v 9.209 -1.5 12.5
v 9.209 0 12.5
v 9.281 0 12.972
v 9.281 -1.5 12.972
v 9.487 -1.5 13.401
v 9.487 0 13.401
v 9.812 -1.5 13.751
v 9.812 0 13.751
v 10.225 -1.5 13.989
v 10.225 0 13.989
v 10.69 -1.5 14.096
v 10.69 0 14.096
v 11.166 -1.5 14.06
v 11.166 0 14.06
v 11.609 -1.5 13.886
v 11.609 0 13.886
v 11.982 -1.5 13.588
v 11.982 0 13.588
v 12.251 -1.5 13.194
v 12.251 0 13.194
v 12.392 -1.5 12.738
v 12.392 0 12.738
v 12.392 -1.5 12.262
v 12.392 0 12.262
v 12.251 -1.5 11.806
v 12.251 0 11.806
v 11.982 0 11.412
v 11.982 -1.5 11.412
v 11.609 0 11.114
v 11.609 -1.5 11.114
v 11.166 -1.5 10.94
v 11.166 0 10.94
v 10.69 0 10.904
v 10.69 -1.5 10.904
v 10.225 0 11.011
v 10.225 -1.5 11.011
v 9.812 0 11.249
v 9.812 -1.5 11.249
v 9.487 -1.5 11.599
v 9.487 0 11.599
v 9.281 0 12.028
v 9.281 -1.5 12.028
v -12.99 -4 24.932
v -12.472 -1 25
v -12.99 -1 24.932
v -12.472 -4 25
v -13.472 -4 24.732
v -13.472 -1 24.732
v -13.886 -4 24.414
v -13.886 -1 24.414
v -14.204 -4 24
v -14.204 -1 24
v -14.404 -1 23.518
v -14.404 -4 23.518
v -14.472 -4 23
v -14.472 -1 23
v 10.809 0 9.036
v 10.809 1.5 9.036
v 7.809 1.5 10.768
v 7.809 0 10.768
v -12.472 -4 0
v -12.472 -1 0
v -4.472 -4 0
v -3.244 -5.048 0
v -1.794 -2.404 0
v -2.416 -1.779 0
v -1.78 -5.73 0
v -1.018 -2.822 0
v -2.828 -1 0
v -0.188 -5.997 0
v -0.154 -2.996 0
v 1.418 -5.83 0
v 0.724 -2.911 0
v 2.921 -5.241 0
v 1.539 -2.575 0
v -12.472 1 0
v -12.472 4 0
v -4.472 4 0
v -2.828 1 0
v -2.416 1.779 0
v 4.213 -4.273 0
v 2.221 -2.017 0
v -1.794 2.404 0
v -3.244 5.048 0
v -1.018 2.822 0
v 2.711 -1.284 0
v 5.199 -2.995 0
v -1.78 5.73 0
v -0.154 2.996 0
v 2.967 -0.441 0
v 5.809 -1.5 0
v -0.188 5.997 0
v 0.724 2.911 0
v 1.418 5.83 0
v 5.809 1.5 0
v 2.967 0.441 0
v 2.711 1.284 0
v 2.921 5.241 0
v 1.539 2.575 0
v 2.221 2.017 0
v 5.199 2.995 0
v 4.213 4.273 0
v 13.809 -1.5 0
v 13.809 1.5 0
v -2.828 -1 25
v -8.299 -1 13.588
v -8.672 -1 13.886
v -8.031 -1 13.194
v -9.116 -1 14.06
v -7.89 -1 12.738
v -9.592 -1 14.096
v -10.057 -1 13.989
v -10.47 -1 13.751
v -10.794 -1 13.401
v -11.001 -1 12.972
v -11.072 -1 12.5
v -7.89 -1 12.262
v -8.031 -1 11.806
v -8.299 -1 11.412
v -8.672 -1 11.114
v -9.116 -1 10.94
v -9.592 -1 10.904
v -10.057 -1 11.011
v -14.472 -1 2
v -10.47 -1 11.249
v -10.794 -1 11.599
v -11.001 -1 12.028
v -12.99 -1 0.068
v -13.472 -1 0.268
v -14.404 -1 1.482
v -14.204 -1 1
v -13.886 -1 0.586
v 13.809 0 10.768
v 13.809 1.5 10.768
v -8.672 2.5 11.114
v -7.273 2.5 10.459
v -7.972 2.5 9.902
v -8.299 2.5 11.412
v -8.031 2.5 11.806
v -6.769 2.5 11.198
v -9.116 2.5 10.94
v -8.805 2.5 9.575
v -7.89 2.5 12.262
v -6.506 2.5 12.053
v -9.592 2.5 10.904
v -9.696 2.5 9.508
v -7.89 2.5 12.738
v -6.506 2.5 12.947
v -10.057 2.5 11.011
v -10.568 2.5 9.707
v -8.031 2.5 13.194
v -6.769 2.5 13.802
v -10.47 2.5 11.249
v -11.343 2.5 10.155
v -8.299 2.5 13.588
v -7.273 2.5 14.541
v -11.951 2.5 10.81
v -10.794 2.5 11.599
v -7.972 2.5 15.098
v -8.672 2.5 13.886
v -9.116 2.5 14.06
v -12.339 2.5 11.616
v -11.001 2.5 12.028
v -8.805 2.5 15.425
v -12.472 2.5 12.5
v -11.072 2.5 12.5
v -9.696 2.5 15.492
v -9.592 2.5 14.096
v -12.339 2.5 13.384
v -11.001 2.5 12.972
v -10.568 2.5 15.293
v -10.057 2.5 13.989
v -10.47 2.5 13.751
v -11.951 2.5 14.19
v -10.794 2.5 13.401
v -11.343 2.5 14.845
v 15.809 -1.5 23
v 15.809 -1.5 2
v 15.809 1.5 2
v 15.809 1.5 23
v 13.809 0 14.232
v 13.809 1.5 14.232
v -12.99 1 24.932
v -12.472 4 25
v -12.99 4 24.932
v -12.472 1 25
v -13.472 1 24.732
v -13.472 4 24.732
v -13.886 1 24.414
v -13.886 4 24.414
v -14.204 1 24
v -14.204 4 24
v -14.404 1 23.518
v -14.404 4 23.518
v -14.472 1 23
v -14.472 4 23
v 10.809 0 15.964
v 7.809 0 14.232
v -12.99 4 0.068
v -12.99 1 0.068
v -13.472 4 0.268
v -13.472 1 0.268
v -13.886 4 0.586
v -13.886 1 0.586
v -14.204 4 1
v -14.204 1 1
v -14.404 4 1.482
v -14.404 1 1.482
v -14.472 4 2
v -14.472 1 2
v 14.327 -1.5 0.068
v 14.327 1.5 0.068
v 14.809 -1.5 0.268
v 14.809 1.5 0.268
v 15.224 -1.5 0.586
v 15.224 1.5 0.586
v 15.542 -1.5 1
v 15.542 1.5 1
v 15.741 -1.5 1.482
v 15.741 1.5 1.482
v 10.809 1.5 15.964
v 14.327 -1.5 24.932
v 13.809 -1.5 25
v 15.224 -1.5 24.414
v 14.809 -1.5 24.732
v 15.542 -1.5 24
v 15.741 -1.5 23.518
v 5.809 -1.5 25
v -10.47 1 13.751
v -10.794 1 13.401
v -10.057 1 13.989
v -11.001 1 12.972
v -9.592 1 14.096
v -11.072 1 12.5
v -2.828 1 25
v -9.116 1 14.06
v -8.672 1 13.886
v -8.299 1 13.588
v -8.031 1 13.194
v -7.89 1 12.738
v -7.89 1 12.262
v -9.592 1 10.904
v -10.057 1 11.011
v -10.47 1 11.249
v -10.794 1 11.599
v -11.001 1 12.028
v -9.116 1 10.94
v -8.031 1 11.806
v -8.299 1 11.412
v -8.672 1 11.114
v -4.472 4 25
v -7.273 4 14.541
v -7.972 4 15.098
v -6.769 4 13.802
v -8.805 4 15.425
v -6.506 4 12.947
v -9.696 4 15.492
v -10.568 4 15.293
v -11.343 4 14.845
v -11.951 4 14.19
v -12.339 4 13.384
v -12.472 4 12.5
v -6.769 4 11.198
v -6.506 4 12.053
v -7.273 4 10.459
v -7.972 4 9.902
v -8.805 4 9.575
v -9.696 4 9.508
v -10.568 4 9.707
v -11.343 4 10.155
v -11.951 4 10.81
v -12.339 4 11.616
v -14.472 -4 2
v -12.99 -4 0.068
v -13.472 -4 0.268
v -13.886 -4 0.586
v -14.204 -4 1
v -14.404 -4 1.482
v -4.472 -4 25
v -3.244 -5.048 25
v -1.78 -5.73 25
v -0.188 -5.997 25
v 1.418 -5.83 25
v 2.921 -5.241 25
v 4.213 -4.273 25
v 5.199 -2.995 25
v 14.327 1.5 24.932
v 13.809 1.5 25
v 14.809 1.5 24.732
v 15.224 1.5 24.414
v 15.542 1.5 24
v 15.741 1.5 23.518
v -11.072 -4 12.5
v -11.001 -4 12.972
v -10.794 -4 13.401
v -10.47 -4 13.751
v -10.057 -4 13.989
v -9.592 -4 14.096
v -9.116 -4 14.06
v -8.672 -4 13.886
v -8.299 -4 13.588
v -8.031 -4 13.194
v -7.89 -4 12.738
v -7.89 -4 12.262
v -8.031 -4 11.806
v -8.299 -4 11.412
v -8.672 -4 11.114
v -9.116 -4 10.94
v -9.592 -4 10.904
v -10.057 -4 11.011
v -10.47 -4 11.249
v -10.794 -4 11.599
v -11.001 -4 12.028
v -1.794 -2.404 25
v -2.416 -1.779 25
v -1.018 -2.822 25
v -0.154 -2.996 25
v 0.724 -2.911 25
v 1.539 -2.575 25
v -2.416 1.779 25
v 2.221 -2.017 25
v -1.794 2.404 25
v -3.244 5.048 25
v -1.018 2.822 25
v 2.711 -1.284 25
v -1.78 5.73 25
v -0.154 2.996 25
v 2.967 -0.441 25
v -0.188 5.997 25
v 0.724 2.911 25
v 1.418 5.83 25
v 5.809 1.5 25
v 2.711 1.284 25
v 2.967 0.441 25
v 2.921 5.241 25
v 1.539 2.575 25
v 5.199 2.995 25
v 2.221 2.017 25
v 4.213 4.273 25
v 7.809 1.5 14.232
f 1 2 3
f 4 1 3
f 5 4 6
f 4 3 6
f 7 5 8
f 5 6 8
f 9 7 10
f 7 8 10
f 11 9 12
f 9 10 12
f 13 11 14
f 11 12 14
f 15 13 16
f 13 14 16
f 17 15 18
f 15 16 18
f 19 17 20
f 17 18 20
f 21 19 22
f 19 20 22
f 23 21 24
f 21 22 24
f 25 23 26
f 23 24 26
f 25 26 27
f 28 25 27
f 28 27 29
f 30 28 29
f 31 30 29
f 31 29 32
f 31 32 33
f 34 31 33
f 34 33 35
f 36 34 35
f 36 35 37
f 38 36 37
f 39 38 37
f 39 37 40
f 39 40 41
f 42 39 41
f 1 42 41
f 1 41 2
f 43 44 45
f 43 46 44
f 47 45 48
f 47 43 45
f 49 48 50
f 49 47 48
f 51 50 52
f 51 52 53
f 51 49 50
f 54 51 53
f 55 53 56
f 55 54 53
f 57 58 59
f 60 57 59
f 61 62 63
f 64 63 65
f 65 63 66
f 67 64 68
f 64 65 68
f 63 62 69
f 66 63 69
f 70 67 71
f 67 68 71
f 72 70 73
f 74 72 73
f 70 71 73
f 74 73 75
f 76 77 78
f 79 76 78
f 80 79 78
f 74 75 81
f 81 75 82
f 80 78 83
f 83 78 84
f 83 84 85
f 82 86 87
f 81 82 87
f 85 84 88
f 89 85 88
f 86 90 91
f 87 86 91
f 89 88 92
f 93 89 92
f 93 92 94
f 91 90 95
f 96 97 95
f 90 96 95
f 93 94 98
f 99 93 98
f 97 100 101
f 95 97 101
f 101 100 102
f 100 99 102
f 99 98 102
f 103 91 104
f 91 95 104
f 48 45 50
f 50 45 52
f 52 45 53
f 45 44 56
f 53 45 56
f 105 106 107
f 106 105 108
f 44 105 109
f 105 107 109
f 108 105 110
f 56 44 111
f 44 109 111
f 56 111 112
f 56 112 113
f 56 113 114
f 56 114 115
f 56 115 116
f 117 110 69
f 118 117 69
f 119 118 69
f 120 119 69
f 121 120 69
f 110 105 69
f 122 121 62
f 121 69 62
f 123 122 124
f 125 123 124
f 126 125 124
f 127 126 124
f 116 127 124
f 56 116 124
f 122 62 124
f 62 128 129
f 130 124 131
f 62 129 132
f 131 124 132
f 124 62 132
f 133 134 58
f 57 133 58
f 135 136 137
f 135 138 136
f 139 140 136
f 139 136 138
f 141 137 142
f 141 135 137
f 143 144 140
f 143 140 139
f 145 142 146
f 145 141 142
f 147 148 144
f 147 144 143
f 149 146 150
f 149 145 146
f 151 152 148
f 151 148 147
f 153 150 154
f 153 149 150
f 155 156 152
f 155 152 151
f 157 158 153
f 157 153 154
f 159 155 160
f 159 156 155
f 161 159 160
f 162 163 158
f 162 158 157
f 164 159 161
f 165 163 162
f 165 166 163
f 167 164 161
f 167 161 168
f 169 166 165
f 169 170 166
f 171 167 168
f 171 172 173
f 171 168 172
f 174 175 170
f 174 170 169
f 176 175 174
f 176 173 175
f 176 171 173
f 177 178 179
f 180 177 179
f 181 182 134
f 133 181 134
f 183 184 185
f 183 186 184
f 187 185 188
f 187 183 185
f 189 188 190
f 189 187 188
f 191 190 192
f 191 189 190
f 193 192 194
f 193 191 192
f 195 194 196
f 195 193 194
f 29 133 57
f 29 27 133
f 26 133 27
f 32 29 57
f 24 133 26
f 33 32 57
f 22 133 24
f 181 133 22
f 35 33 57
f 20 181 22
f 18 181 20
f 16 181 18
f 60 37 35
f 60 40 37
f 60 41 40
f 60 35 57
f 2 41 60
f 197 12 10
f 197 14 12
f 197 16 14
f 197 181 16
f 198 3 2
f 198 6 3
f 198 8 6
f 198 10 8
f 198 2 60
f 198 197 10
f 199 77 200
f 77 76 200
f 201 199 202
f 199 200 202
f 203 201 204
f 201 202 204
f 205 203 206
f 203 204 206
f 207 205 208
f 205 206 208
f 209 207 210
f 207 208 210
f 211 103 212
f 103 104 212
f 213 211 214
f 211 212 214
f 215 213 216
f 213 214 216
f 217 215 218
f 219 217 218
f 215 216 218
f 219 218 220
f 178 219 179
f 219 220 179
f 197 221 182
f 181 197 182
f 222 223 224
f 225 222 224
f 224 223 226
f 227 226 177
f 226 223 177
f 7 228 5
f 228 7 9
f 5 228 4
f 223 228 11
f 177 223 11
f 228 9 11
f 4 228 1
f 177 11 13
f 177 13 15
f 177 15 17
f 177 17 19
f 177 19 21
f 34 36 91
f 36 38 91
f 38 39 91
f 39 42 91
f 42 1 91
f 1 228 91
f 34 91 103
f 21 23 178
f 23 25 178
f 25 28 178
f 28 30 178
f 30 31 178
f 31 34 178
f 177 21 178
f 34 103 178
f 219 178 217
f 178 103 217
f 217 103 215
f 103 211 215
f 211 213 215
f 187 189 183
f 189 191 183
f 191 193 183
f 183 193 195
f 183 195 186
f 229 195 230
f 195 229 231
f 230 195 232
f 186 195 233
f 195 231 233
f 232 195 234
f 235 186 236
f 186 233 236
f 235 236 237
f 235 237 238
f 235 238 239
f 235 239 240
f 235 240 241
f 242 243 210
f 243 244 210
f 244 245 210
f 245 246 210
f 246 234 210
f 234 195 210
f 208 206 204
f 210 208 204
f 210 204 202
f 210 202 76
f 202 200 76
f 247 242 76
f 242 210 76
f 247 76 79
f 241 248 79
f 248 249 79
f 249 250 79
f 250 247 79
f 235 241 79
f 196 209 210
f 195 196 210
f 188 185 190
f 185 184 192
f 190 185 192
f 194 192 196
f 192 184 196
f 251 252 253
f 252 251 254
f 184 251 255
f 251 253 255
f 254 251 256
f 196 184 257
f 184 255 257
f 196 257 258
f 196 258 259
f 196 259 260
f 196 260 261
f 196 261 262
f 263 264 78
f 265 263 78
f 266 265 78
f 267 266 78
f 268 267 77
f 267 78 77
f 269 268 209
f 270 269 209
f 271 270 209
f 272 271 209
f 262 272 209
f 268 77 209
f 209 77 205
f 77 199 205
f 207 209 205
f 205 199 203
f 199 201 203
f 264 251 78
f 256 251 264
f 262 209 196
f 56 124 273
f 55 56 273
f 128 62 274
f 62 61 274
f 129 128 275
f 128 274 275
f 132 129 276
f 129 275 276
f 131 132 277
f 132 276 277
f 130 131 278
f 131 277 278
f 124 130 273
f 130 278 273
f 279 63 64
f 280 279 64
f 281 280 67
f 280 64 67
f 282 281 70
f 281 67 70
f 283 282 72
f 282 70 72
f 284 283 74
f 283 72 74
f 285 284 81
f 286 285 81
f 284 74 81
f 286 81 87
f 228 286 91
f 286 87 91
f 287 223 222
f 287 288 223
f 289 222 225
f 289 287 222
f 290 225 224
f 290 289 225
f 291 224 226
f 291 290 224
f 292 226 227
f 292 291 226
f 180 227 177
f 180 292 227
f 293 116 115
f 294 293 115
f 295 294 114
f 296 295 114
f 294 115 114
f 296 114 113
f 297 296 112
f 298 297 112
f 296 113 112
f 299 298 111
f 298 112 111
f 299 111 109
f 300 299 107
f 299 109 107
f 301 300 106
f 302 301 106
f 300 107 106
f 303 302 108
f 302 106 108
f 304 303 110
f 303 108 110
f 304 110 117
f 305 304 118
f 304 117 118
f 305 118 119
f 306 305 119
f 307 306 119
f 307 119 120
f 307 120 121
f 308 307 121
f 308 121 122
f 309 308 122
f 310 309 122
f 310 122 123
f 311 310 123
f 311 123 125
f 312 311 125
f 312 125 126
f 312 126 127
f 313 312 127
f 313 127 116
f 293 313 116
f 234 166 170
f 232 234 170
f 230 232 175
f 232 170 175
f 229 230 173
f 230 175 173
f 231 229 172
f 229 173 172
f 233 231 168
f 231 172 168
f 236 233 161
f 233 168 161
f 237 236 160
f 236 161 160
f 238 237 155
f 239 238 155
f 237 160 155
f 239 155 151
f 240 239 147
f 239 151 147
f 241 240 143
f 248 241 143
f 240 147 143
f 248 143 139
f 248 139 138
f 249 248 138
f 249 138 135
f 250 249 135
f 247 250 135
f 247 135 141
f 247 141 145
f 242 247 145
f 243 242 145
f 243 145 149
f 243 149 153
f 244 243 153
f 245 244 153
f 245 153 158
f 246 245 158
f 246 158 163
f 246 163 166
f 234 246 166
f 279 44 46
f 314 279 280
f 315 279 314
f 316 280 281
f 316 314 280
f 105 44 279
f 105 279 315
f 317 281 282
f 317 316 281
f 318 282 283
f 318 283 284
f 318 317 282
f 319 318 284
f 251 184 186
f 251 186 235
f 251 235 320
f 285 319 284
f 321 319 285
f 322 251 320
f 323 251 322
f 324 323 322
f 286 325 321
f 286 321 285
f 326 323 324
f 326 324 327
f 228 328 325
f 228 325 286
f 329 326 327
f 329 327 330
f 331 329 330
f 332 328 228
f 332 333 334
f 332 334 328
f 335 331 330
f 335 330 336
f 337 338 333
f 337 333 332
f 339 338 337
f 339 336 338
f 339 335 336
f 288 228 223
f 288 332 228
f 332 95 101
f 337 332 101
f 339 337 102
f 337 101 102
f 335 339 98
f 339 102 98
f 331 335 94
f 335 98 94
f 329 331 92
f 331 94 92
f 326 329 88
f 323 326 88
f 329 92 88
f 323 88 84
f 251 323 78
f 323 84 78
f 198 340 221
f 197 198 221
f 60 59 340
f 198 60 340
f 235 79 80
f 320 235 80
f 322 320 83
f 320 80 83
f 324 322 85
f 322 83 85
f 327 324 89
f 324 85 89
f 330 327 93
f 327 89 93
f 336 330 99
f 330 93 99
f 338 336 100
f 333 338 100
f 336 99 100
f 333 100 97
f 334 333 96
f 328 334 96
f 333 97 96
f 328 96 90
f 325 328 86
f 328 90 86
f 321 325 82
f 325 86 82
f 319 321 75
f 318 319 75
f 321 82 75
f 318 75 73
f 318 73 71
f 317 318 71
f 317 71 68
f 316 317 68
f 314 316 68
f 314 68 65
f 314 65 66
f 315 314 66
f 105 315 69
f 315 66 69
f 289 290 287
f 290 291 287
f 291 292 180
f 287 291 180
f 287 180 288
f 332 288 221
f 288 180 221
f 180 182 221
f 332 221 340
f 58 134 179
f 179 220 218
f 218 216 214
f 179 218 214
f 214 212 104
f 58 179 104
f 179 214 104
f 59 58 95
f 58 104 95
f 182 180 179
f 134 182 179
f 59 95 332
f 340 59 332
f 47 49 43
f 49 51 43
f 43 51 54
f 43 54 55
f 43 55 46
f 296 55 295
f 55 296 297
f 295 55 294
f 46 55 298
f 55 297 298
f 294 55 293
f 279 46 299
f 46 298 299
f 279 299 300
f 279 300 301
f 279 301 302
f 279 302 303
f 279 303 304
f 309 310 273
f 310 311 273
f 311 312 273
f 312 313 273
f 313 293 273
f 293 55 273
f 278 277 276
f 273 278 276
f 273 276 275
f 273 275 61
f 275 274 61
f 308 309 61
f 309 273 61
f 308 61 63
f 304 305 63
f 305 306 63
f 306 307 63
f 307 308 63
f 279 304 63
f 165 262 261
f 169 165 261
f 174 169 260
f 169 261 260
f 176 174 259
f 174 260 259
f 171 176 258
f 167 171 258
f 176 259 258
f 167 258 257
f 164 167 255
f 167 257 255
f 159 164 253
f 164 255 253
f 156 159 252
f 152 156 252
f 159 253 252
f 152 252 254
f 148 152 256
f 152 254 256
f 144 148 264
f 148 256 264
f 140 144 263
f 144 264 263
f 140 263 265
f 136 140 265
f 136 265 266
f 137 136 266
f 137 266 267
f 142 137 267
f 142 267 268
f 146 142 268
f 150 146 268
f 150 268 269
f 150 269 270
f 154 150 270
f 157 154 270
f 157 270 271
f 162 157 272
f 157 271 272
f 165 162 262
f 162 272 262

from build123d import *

# Parameters (mm, degrees)
F1_DEPTH = 25
F2_R     = 1.6
F3_DEPTH = 10.001
F2_R_2   = 3
F4_DEPTH = 1.5
F5_R     = 2
F6_R     = 1.6
F7_DEPTH = 7.501
F8_DEPTH = 1.5
F9_R     = 2


with BuildPart() as f1:
    # F0 (on Top) → F1 (new body)
    with BuildSketch(Plane.XY):
        with BuildLine():
            ThreePointArc((-2.828427, 1), (3, 0), (-2.828427, -1))
            Line((-2.828427, -1), (-14.472136, -1))
            Line((-14.472136, -1), (-14.472136, -4))
            Line((-14.472136, -4), (-4.472136, -4))
            ThreePointArc((-4.472136, -4), (1.41761, -5.830127), (5.809475, -1.5))
            Line((5.809475, -1.5), (15.809475, -1.5))
            Line((15.809475, -1.5), (15.809475, 1.5))
            Line((15.809475, 1.5), (5.809475, 1.5))
            ThreePointArc((5.809475, 1.5), (1.41761, 5.830127), (-4.472136, 4))
            Line((-4.472136, 4), (-14.472136, 4))
            Line((-14.472136, 4), (-14.472136, 1))
            Line((-14.472136, 1), (-2.828427, 1))
        make_face()
    extrude(amount=F1_DEPTH)

    # F2 (on face) → F3 (cut, through all)
    with BuildSketch(Plane(origin=(0, 4, 0), x_dir=(-1, 0, 0), z_dir=(0, 1, 0))):
        with Locations((9.472136, 12.5)):
            Circle(F2_R)
    extrude(amount=-F3_DEPTH, mode=Mode.SUBTRACT)

    # F2 (on face) → F4 (cut)
    with BuildSketch(Plane(origin=(0, 4, 0), x_dir=(-1, 0, 0), z_dir=(0, 1, 0))):
        with Locations((9.472136, 12.5)):
            Circle(F2_R_2)
        with Locations((9.472136, 12.5)):
            Circle(F2_R, mode=Mode.SUBTRACT)
    extrude(amount=-F4_DEPTH, mode=Mode.SUBTRACT)

    # F5
    f5_edges = [f1.edges().sort_by_distance(p)[0] for p in [
        (-14.472136, 2.5, 0),
        (-14.472136, -2.5, 0),
        (-14.472136, -2.5, 25),
        (-14.472136, 2.5, 25),
    ]]
    fillet(f5_edges, radius=F5_R)

    # F6 (on face) → F7 (cut, through all)
    with BuildSketch(Plane(origin=(0, 1.5, 0), x_dir=(-1, 0, 0), z_dir=(0, 1, 0))):
        with Locations((-10.809475, 12.5)):
            Circle(F6_R)
    extrude(amount=-F7_DEPTH, mode=Mode.SUBTRACT)

    # F6 (on face) → F8 (cut)
    with BuildSketch(Plane(origin=(0, 1.5, 0), x_dir=(-1, 0, 0), z_dir=(0, 1, 0))):
        Polygon((-13.809475, 14.232051), (-13.809475, 10.767949), (-10.809475, 9.035898), (-7.809475, 10.767949), (-7.809475, 14.232051), (-10.809475, 15.964102), align=None)
        with Locations((-10.809475, 12.5)):
            Circle(F6_R, mode=Mode.SUBTRACT)
    extrude(amount=-F8_DEPTH, mode=Mode.SUBTRACT)

    # F9
    f9_edges = [f1.edges().sort_by_distance(p)[0] for p in [
        (15.809475, 0, 25),
        (15.809475, 0, 0),
    ]]
    fillet(f9_edges, radius=F9_R)


solid = f1.part
